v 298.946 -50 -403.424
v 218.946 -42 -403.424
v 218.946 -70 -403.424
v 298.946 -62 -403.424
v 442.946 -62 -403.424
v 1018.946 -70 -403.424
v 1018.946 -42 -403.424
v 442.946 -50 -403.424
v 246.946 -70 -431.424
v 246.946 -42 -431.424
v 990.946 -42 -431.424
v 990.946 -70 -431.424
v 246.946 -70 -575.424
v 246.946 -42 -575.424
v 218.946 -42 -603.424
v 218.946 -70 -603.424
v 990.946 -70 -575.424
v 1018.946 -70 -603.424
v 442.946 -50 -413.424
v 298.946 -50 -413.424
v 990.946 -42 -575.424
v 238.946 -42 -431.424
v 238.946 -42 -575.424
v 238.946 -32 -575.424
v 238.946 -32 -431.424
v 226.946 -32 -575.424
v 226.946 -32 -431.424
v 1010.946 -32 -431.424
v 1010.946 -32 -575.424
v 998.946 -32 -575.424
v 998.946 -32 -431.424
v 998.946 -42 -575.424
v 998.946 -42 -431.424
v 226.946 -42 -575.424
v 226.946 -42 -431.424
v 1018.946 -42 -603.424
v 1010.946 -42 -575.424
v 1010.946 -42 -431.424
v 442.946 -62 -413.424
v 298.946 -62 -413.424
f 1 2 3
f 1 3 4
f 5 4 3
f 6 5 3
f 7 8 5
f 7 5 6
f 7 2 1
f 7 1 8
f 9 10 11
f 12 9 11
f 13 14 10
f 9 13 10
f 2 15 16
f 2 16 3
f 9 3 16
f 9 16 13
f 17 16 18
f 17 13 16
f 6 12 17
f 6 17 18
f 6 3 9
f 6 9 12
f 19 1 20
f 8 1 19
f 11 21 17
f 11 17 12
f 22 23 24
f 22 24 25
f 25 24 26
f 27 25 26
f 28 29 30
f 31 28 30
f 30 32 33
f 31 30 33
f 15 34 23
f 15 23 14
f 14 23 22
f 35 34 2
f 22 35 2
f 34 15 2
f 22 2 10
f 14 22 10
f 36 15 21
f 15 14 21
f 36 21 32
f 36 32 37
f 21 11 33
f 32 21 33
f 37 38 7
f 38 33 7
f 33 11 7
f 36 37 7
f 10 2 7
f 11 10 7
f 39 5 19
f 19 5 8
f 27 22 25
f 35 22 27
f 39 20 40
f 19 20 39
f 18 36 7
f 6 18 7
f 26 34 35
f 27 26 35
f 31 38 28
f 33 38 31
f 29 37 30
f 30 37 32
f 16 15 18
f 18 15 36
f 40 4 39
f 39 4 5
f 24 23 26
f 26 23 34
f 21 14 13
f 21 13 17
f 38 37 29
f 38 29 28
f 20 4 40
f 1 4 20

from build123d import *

# Parameters (mm, degrees)
F0_W     = 2000
F0_H     = 500
F0_W_2   = 1860
F0_H_2   = 360
F1_DEPTH = 70
F2_W     = 30
F2_H     = 360
F3_DEPTH = 25
F4_DEPTH = 25
F5_W     = 360
F5_H     = 30
F6_DEPTH = 25
F7_SCALE = 0.4


with BuildPart() as f1:
    # F0 (on Front) → F1 (new body)
    with BuildSketch(Plane.XZ):
        with Locations((18.9460813999, -353.4244084814)):
            Rectangle(F0_W, F0_H)
        with Locations((18.9460813999, -353.4244084814)):
            Rectangle(F0_W_2, F0_H_2, mode=Mode.SUBTRACT)
    extrude(amount=F1_DEPTH)



with BuildPart() as f3:
    # F2 (on face) → F3 (new body)
    with BuildSketch(Plane(origin=(0, 0, 0), x_dir=(-1, 0, 0), z_dir=(0, 1, 0))):
        with Locations((946.0539186001, -353.4244084814)):
            Rectangle(F2_W, F2_H)
    extrude(amount=-F3_DEPTH)


with BuildPart() as f1_1:
    add(f1.part)

    add(f3.part)  # F4 merges F3
    # F2 (on face) → F4 (join)
    with BuildSketch(Plane(origin=(0, 0, 0), x_dir=(-1, 0, 0), z_dir=(0, 1, 0))):
        with Locations((-983.9460813999, -353.4244084814)):
            Rectangle(F2_W, F2_H)
        with Locations((946.0539186001, -353.4244084814)):
            Rectangle(F2_W, F2_H)
    extrude(amount=F4_DEPTH)

    # F5 (on face) → F6 (cut)
    with BuildSketch(Plane.XY.offset(-103.4244084814)):
        with Locations((-601.0539186001, -35)):
            Rectangle(F5_W, F5_H)
    extrude(amount=-F6_DEPTH, mode=Mode.SUBTRACT)


with BuildPart() as f1_2:
    # F7: moved
    add(f1_1.part.scale(F7_SCALE).moved(Location((611.36764884, -42, -362.0546450888))))


solid = f1_2.part
